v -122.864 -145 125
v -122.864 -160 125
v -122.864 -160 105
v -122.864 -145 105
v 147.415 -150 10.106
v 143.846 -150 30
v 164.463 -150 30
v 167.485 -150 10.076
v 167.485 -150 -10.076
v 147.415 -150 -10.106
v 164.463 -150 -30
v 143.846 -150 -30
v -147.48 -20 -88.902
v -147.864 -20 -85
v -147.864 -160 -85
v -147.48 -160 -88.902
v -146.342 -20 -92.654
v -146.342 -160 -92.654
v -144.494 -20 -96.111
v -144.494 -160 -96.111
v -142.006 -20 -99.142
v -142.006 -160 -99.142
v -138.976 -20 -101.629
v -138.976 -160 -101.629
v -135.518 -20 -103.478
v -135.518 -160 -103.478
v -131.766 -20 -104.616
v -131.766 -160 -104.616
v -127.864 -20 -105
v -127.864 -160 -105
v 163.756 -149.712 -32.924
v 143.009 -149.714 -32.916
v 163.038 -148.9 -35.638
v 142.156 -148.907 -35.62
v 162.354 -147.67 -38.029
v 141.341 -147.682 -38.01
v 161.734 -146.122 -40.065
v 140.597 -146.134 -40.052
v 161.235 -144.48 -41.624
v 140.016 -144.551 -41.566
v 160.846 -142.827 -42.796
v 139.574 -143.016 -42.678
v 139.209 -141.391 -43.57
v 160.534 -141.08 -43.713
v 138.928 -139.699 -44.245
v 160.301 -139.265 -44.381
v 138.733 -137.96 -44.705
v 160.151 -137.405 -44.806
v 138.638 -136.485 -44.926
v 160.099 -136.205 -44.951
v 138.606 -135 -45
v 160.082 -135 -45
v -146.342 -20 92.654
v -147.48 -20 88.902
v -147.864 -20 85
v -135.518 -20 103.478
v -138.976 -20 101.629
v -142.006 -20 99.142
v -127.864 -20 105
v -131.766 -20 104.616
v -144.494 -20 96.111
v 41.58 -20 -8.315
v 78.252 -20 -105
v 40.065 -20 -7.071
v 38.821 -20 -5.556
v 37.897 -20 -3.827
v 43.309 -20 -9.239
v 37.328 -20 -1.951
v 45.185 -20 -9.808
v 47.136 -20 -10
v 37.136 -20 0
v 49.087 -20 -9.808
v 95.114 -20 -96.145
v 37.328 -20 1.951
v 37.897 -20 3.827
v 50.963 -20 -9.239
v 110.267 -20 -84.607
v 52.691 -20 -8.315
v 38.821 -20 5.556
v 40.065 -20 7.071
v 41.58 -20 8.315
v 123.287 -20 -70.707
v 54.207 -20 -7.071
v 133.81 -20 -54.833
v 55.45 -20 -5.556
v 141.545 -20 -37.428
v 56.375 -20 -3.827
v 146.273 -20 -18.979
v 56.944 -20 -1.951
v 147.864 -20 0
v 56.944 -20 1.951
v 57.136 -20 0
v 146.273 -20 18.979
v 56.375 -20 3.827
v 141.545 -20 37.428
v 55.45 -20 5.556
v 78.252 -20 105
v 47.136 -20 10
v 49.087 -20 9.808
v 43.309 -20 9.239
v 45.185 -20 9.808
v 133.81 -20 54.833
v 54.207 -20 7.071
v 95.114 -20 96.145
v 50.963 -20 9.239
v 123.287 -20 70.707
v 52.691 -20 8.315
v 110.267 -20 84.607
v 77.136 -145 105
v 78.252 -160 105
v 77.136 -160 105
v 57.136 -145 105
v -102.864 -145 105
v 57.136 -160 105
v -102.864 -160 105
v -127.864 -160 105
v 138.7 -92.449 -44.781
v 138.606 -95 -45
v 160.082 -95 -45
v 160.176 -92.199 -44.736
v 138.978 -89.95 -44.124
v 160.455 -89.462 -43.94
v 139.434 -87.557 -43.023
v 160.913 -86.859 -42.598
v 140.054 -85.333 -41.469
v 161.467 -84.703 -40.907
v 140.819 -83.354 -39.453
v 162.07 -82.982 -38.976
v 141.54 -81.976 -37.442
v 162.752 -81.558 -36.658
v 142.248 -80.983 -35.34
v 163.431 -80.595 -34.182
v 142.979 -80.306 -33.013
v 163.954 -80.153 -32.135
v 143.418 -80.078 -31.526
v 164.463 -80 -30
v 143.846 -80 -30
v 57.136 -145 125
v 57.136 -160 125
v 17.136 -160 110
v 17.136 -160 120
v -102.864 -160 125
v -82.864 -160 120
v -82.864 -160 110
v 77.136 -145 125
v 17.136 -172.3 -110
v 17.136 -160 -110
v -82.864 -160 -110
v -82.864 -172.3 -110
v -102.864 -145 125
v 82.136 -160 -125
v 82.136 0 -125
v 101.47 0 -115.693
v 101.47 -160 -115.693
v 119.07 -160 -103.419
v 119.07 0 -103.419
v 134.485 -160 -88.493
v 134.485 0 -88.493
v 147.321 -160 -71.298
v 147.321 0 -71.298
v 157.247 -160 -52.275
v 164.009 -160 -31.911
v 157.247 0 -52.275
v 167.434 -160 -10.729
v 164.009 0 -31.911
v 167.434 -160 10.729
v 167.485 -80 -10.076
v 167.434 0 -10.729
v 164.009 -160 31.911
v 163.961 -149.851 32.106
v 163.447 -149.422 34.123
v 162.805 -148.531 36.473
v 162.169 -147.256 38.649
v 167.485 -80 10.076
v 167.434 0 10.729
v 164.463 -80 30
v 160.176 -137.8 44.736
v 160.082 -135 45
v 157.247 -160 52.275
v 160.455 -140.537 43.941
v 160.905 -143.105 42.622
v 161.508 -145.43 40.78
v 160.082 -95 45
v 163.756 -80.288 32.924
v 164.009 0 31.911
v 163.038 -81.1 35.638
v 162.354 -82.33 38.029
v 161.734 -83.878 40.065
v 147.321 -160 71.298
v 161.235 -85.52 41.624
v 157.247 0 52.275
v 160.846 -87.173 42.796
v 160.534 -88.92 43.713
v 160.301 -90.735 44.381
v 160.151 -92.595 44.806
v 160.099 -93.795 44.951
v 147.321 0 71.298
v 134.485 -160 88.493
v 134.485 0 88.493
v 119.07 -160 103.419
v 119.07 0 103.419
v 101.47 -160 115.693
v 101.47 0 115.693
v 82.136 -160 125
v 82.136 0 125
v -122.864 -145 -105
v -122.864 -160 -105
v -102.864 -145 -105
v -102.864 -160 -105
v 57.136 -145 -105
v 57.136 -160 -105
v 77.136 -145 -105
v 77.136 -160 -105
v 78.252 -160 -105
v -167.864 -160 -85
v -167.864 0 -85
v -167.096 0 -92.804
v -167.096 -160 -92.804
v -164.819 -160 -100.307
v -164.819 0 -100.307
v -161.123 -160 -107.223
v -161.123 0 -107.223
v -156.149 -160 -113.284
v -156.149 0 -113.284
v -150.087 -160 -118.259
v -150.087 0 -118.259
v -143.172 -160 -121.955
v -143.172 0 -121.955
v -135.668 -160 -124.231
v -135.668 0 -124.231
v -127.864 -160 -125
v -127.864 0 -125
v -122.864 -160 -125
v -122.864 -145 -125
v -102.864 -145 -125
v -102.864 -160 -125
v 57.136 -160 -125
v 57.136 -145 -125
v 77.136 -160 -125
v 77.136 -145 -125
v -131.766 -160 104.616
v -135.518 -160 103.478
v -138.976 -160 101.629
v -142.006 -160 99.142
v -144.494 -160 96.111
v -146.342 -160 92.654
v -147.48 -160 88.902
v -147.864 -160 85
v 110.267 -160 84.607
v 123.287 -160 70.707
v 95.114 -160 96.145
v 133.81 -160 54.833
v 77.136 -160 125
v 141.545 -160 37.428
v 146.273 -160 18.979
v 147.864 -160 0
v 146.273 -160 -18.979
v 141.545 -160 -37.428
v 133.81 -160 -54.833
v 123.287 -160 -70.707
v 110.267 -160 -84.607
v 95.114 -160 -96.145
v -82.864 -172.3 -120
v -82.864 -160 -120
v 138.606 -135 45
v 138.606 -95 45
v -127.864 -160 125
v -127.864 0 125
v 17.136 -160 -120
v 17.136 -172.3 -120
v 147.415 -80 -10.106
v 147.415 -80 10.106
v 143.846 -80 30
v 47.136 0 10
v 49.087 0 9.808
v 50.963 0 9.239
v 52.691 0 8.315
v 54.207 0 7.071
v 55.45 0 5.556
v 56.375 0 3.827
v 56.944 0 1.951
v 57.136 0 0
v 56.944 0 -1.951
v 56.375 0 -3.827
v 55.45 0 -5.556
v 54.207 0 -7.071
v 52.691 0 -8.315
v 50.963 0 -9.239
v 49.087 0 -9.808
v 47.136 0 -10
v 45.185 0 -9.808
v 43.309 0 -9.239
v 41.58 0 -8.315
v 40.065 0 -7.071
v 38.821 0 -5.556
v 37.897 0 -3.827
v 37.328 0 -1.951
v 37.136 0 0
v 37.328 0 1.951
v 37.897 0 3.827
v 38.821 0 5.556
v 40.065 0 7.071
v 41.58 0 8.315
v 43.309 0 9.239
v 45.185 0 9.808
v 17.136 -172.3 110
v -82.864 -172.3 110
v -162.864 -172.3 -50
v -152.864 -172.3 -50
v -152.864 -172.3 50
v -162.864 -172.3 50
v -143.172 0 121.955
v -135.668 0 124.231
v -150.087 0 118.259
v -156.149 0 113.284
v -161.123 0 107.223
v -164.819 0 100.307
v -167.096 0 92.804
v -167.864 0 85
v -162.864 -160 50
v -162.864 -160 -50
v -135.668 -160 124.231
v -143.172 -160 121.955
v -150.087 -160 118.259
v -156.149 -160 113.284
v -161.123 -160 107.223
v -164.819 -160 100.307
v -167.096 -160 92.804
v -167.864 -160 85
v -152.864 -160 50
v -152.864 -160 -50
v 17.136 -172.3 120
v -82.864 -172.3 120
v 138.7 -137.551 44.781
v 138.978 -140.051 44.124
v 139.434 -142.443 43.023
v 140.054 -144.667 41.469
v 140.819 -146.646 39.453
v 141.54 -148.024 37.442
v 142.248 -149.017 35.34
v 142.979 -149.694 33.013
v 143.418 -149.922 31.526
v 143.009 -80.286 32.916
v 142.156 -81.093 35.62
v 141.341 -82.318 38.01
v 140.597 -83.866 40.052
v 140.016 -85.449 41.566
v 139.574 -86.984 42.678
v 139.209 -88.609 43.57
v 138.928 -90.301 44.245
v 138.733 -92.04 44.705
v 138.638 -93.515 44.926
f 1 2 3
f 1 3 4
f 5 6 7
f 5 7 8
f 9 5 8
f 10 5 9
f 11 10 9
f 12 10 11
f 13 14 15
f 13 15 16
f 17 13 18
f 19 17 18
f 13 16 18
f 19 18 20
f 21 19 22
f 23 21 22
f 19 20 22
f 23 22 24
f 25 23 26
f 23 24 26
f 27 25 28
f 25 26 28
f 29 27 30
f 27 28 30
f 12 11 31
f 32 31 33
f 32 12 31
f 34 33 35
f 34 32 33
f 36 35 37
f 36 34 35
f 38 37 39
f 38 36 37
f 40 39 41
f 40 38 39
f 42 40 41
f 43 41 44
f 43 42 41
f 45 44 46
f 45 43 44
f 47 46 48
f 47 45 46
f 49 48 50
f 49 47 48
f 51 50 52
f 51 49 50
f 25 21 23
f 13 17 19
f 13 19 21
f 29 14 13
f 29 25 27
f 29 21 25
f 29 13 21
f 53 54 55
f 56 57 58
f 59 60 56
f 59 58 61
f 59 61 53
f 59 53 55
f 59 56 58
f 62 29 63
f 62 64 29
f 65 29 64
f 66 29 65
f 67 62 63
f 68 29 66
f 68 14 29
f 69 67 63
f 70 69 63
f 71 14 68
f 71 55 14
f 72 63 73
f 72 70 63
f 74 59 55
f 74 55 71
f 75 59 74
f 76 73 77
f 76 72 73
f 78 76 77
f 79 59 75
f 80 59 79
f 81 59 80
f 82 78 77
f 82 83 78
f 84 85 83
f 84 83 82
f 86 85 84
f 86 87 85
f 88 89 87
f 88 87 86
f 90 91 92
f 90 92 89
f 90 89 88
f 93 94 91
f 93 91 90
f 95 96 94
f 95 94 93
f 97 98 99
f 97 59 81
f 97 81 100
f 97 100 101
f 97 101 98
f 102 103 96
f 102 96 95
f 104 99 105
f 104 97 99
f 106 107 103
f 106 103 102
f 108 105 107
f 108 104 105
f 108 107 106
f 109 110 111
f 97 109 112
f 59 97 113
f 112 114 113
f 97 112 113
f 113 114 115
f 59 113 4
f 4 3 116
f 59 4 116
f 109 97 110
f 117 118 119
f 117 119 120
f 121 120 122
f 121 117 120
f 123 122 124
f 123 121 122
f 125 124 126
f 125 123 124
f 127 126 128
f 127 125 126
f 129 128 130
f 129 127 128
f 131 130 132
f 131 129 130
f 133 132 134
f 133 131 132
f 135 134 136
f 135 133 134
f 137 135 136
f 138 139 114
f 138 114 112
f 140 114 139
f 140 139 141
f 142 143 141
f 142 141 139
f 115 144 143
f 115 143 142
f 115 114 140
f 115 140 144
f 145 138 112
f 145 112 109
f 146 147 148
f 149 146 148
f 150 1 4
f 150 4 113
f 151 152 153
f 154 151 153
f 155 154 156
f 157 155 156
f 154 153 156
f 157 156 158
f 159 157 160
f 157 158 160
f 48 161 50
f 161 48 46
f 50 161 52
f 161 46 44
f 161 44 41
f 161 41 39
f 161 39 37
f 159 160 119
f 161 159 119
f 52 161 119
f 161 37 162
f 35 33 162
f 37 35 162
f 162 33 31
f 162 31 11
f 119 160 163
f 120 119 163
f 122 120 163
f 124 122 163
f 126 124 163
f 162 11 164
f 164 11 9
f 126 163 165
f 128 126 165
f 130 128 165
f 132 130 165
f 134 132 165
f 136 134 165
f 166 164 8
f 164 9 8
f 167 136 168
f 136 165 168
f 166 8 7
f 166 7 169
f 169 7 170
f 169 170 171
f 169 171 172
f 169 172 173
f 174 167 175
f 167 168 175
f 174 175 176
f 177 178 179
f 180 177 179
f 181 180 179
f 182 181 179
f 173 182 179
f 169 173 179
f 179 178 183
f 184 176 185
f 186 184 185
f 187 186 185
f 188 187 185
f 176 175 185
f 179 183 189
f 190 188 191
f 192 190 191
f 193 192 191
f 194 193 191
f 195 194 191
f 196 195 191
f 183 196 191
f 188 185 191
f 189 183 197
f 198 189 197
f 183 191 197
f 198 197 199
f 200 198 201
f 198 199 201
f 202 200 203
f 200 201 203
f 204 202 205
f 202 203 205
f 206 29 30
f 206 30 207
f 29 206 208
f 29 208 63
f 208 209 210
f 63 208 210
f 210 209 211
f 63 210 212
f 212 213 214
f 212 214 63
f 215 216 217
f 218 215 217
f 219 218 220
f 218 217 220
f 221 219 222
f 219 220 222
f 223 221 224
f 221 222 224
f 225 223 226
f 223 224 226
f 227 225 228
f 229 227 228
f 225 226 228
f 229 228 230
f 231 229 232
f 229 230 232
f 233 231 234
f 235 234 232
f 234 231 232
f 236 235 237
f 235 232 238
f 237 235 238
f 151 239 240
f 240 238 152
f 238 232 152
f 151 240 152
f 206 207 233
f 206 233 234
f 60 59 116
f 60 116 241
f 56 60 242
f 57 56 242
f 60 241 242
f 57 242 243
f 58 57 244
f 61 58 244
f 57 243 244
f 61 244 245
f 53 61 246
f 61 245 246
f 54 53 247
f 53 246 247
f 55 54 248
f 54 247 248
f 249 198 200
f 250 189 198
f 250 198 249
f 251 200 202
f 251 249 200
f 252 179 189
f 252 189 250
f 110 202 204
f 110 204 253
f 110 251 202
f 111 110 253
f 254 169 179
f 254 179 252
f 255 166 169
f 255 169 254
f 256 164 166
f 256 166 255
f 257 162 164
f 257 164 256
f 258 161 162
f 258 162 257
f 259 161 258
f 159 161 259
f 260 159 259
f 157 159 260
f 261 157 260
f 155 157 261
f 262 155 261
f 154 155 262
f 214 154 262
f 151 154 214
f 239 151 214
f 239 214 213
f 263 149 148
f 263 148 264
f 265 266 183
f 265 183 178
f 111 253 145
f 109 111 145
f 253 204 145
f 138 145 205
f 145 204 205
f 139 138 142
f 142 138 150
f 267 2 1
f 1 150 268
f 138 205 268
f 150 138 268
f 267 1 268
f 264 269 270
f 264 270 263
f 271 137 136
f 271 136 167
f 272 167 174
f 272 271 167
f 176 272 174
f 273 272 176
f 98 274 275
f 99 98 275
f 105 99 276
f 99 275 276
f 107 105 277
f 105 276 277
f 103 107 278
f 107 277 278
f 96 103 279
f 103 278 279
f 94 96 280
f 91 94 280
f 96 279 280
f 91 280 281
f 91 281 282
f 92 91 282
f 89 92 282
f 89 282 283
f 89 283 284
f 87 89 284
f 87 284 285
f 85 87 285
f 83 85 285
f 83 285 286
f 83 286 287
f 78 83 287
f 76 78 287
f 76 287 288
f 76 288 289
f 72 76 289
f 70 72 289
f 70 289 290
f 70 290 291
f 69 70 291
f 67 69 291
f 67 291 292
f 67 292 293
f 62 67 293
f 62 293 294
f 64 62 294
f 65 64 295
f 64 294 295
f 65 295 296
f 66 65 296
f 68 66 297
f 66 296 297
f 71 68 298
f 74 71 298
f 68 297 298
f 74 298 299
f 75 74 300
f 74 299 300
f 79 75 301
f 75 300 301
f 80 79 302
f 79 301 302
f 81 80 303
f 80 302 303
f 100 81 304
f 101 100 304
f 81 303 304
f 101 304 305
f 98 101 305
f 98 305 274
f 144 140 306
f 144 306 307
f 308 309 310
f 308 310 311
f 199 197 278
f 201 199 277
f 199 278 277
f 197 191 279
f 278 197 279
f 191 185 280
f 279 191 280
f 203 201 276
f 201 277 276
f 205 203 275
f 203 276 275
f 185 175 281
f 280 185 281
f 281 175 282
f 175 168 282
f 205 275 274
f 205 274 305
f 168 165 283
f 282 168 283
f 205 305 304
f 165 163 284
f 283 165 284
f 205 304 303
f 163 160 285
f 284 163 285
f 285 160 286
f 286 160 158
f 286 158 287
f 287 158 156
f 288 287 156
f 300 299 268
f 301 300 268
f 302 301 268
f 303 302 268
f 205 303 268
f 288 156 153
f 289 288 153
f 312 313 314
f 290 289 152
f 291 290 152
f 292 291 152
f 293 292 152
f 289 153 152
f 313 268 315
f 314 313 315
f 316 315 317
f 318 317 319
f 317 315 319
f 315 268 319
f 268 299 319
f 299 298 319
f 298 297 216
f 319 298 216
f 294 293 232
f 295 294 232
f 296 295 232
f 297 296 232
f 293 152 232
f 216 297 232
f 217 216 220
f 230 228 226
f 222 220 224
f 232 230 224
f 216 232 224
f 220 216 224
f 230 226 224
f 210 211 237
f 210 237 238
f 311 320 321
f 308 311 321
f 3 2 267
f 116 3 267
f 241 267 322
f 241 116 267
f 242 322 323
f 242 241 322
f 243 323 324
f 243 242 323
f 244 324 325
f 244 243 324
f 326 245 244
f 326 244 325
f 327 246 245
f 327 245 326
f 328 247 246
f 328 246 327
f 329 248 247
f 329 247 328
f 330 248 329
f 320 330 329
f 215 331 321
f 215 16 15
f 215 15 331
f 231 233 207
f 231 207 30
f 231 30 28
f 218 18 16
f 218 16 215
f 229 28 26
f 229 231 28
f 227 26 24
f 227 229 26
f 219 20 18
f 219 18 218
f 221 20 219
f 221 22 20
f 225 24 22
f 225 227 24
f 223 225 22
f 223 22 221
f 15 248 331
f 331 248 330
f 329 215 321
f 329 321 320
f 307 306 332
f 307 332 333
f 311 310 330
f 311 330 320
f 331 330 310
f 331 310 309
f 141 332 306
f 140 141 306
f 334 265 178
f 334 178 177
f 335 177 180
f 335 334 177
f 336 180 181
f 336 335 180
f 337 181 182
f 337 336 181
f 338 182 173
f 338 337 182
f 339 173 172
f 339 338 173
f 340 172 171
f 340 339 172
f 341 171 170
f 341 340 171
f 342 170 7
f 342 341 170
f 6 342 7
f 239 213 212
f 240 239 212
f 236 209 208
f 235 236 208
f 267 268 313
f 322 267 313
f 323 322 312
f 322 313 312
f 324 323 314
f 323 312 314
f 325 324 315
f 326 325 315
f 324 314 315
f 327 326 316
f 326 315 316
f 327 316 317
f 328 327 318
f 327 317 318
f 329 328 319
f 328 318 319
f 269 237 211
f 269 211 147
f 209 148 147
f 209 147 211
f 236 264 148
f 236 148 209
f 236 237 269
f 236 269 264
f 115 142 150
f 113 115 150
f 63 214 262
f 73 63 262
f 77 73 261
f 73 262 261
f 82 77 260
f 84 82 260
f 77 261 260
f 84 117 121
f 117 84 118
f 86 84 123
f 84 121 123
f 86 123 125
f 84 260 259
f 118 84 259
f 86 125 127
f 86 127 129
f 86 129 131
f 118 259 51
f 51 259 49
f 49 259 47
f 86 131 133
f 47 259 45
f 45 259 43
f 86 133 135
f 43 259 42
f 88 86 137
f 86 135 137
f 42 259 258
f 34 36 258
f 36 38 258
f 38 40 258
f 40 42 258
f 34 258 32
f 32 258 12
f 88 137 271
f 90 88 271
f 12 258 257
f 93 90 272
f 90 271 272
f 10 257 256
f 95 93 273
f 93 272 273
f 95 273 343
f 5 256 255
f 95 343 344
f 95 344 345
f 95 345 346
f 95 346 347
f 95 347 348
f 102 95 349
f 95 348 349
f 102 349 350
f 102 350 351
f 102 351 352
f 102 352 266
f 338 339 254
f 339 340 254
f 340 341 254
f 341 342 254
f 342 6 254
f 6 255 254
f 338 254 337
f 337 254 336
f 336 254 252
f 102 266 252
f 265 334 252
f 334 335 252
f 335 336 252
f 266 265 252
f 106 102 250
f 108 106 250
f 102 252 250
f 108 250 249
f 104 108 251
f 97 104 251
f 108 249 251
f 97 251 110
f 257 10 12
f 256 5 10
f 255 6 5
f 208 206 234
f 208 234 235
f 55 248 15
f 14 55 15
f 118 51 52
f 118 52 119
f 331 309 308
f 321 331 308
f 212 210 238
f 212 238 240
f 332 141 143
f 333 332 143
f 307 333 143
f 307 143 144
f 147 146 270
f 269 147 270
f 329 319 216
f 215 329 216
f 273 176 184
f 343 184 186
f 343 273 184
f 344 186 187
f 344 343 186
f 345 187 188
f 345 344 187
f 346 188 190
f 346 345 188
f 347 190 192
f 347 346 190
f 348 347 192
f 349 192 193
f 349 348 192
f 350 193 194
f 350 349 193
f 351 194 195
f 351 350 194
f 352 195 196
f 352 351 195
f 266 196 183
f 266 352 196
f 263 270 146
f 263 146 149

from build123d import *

# Parameters (mm, degrees)
Y_KSEKLIK_EKSTR_ZYON1_DEPTH = 160
KES_EKSTR_ZYON1_DEPTH       = 140
IZIM3_W                     = 10
IZIM3_H                     = 100
IZIM3_W_2                   = 100
IZIM3_H_2                   = 10
Y_KSEKLIK_EKSTR_ZYON2_DEPTH = 12.3
IZIM4_R                     = 10
KES_EKSTR_ZYON2_DEPTH       = 641.3
KES_EKSTR_ZYON3_DEPTH       = 641.3
IZIM7_W                     = 20
IZIM7_H                     = 15
KES_EKSTR_ZYON4_DEPTH       = 641.3


with BuildPart() as part:
    # Çizim1 → Yükseklik-Ekstrüzyon1 (new body)
    with BuildSketch(Plane(origin=(0, 0, 0), x_dir=(1, 0, 0), z_dir=(0, 1, 0))):
        with BuildLine():
            Line((-127.864290172, 125), (82.135709828, 125))
            ThreePointArc((82.135709828, 125), (167.864290172, 0), (82.135709828, -125))
            Line((82.135709828, -125), (-127.864290172, -125))
            ThreePointArc((-127.864290172, -125), (-156.14856142, -113.284271247), (-167.864290172, -85))
            Line((-167.864290172, -85), (-167.864290172, 85))
            ThreePointArc((-167.864290172, 85), (-156.14856142, 113.284271247), (-127.864290172, 125))
        make_face()
    extrude(amount=-Y_KSEKLIK_EKSTR_ZYON1_DEPTH)

    # Çizim2 → Kes-Ekstrüzyon1 (cut)
    with BuildSketch(Plane.XZ.offset(160)):
        with BuildLine():
            Line((-127.864290172, -105), (78.252278635, -105))
            ThreePointArc((78.252278635, -105), (147.864290172, 0), (78.252278635, 105))
            Line((78.252278635, 105), (-127.864290172, 105))
            ThreePointArc((-127.864290172, 105), (-142.006425796, 99.142135624), (-147.864290172, 85))
            Line((-147.864290172, 85), (-147.864290172, -85))
            ThreePointArc((-147.864290172, -85), (-142.006425796, -99.142135624), (-127.864290172, -105))
        make_face()
    extrude(amount=-KES_EKSTR_ZYON1_DEPTH, mode=Mode.SUBTRACT)

    # Çizim3 → Yükseklik-Ekstrüzyon2 (add)
    with BuildSketch(Plane(origin=(0, -160, 0), x_dir=(-1, 0, 0), z_dir=(0, -1, 0))):
        with Locations((157.864290172, 0)):
            Rectangle(IZIM3_W, IZIM3_H)
        with Locations((32.864290172, 115)):
            Rectangle(IZIM3_W_2, IZIM3_H_2)
        with Locations((32.864290172, -115)):
            Rectangle(IZIM3_W_2, IZIM3_H_2)
    extrude(amount=Y_KSEKLIK_EKSTR_ZYON2_DEPTH)

    # Çizim4 → Kes-Ekstrüzyon2 (cut)
    with BuildSketch(Plane(origin=(0, 0, 0), x_dir=(1, 0, 0), z_dir=(0, 1, 0))):
        with Locations(Location((47.135709828, 0, 0), (0, 0, 270))):
            Circle(IZIM4_R)
    extrude(amount=-KES_EKSTR_ZYON2_DEPTH, mode=Mode.SUBTRACT)

    # Çizim6 → Kes-Ekstrüzyon3 (cut)
    with BuildSketch(Plane.ZY.offset(-62.135709828)):
        with BuildLine():
            Line((-30, -80), (30, -80))
            ThreePointArc((30, -80), (40.606601718, -84.393398282), (45, -95))
            Line((45, -95), (45, -135))
            ThreePointArc((45, -135), (40.606601718, -145.606601718), (30, -150))
            Line((30, -150), (-30, -150))
            ThreePointArc((-30, -150), (-40.606601718, -145.606601718), (-45, -135))
            Line((-45, -135), (-45, -95))
            ThreePointArc((-45, -95), (-40.606601718, -84.393398282), (-30, -80))
        make_face()
    extrude(amount=-KES_EKSTR_ZYON3_DEPTH, mode=Mode.SUBTRACT)

    # Çizim7 → Kes-Ekstrüzyon4 (cut)
    with BuildSketch(Plane.XY.offset(125)):
        with Locations((-112.864290172, -152.5)):
            Rectangle(IZIM7_W, IZIM7_H)
        with Locations((67.135709828, -152.5)):
            Rectangle(IZIM7_W, IZIM7_H)
    extrude(amount=-KES_EKSTR_ZYON4_DEPTH, mode=Mode.SUBTRACT)


solid = part.part
